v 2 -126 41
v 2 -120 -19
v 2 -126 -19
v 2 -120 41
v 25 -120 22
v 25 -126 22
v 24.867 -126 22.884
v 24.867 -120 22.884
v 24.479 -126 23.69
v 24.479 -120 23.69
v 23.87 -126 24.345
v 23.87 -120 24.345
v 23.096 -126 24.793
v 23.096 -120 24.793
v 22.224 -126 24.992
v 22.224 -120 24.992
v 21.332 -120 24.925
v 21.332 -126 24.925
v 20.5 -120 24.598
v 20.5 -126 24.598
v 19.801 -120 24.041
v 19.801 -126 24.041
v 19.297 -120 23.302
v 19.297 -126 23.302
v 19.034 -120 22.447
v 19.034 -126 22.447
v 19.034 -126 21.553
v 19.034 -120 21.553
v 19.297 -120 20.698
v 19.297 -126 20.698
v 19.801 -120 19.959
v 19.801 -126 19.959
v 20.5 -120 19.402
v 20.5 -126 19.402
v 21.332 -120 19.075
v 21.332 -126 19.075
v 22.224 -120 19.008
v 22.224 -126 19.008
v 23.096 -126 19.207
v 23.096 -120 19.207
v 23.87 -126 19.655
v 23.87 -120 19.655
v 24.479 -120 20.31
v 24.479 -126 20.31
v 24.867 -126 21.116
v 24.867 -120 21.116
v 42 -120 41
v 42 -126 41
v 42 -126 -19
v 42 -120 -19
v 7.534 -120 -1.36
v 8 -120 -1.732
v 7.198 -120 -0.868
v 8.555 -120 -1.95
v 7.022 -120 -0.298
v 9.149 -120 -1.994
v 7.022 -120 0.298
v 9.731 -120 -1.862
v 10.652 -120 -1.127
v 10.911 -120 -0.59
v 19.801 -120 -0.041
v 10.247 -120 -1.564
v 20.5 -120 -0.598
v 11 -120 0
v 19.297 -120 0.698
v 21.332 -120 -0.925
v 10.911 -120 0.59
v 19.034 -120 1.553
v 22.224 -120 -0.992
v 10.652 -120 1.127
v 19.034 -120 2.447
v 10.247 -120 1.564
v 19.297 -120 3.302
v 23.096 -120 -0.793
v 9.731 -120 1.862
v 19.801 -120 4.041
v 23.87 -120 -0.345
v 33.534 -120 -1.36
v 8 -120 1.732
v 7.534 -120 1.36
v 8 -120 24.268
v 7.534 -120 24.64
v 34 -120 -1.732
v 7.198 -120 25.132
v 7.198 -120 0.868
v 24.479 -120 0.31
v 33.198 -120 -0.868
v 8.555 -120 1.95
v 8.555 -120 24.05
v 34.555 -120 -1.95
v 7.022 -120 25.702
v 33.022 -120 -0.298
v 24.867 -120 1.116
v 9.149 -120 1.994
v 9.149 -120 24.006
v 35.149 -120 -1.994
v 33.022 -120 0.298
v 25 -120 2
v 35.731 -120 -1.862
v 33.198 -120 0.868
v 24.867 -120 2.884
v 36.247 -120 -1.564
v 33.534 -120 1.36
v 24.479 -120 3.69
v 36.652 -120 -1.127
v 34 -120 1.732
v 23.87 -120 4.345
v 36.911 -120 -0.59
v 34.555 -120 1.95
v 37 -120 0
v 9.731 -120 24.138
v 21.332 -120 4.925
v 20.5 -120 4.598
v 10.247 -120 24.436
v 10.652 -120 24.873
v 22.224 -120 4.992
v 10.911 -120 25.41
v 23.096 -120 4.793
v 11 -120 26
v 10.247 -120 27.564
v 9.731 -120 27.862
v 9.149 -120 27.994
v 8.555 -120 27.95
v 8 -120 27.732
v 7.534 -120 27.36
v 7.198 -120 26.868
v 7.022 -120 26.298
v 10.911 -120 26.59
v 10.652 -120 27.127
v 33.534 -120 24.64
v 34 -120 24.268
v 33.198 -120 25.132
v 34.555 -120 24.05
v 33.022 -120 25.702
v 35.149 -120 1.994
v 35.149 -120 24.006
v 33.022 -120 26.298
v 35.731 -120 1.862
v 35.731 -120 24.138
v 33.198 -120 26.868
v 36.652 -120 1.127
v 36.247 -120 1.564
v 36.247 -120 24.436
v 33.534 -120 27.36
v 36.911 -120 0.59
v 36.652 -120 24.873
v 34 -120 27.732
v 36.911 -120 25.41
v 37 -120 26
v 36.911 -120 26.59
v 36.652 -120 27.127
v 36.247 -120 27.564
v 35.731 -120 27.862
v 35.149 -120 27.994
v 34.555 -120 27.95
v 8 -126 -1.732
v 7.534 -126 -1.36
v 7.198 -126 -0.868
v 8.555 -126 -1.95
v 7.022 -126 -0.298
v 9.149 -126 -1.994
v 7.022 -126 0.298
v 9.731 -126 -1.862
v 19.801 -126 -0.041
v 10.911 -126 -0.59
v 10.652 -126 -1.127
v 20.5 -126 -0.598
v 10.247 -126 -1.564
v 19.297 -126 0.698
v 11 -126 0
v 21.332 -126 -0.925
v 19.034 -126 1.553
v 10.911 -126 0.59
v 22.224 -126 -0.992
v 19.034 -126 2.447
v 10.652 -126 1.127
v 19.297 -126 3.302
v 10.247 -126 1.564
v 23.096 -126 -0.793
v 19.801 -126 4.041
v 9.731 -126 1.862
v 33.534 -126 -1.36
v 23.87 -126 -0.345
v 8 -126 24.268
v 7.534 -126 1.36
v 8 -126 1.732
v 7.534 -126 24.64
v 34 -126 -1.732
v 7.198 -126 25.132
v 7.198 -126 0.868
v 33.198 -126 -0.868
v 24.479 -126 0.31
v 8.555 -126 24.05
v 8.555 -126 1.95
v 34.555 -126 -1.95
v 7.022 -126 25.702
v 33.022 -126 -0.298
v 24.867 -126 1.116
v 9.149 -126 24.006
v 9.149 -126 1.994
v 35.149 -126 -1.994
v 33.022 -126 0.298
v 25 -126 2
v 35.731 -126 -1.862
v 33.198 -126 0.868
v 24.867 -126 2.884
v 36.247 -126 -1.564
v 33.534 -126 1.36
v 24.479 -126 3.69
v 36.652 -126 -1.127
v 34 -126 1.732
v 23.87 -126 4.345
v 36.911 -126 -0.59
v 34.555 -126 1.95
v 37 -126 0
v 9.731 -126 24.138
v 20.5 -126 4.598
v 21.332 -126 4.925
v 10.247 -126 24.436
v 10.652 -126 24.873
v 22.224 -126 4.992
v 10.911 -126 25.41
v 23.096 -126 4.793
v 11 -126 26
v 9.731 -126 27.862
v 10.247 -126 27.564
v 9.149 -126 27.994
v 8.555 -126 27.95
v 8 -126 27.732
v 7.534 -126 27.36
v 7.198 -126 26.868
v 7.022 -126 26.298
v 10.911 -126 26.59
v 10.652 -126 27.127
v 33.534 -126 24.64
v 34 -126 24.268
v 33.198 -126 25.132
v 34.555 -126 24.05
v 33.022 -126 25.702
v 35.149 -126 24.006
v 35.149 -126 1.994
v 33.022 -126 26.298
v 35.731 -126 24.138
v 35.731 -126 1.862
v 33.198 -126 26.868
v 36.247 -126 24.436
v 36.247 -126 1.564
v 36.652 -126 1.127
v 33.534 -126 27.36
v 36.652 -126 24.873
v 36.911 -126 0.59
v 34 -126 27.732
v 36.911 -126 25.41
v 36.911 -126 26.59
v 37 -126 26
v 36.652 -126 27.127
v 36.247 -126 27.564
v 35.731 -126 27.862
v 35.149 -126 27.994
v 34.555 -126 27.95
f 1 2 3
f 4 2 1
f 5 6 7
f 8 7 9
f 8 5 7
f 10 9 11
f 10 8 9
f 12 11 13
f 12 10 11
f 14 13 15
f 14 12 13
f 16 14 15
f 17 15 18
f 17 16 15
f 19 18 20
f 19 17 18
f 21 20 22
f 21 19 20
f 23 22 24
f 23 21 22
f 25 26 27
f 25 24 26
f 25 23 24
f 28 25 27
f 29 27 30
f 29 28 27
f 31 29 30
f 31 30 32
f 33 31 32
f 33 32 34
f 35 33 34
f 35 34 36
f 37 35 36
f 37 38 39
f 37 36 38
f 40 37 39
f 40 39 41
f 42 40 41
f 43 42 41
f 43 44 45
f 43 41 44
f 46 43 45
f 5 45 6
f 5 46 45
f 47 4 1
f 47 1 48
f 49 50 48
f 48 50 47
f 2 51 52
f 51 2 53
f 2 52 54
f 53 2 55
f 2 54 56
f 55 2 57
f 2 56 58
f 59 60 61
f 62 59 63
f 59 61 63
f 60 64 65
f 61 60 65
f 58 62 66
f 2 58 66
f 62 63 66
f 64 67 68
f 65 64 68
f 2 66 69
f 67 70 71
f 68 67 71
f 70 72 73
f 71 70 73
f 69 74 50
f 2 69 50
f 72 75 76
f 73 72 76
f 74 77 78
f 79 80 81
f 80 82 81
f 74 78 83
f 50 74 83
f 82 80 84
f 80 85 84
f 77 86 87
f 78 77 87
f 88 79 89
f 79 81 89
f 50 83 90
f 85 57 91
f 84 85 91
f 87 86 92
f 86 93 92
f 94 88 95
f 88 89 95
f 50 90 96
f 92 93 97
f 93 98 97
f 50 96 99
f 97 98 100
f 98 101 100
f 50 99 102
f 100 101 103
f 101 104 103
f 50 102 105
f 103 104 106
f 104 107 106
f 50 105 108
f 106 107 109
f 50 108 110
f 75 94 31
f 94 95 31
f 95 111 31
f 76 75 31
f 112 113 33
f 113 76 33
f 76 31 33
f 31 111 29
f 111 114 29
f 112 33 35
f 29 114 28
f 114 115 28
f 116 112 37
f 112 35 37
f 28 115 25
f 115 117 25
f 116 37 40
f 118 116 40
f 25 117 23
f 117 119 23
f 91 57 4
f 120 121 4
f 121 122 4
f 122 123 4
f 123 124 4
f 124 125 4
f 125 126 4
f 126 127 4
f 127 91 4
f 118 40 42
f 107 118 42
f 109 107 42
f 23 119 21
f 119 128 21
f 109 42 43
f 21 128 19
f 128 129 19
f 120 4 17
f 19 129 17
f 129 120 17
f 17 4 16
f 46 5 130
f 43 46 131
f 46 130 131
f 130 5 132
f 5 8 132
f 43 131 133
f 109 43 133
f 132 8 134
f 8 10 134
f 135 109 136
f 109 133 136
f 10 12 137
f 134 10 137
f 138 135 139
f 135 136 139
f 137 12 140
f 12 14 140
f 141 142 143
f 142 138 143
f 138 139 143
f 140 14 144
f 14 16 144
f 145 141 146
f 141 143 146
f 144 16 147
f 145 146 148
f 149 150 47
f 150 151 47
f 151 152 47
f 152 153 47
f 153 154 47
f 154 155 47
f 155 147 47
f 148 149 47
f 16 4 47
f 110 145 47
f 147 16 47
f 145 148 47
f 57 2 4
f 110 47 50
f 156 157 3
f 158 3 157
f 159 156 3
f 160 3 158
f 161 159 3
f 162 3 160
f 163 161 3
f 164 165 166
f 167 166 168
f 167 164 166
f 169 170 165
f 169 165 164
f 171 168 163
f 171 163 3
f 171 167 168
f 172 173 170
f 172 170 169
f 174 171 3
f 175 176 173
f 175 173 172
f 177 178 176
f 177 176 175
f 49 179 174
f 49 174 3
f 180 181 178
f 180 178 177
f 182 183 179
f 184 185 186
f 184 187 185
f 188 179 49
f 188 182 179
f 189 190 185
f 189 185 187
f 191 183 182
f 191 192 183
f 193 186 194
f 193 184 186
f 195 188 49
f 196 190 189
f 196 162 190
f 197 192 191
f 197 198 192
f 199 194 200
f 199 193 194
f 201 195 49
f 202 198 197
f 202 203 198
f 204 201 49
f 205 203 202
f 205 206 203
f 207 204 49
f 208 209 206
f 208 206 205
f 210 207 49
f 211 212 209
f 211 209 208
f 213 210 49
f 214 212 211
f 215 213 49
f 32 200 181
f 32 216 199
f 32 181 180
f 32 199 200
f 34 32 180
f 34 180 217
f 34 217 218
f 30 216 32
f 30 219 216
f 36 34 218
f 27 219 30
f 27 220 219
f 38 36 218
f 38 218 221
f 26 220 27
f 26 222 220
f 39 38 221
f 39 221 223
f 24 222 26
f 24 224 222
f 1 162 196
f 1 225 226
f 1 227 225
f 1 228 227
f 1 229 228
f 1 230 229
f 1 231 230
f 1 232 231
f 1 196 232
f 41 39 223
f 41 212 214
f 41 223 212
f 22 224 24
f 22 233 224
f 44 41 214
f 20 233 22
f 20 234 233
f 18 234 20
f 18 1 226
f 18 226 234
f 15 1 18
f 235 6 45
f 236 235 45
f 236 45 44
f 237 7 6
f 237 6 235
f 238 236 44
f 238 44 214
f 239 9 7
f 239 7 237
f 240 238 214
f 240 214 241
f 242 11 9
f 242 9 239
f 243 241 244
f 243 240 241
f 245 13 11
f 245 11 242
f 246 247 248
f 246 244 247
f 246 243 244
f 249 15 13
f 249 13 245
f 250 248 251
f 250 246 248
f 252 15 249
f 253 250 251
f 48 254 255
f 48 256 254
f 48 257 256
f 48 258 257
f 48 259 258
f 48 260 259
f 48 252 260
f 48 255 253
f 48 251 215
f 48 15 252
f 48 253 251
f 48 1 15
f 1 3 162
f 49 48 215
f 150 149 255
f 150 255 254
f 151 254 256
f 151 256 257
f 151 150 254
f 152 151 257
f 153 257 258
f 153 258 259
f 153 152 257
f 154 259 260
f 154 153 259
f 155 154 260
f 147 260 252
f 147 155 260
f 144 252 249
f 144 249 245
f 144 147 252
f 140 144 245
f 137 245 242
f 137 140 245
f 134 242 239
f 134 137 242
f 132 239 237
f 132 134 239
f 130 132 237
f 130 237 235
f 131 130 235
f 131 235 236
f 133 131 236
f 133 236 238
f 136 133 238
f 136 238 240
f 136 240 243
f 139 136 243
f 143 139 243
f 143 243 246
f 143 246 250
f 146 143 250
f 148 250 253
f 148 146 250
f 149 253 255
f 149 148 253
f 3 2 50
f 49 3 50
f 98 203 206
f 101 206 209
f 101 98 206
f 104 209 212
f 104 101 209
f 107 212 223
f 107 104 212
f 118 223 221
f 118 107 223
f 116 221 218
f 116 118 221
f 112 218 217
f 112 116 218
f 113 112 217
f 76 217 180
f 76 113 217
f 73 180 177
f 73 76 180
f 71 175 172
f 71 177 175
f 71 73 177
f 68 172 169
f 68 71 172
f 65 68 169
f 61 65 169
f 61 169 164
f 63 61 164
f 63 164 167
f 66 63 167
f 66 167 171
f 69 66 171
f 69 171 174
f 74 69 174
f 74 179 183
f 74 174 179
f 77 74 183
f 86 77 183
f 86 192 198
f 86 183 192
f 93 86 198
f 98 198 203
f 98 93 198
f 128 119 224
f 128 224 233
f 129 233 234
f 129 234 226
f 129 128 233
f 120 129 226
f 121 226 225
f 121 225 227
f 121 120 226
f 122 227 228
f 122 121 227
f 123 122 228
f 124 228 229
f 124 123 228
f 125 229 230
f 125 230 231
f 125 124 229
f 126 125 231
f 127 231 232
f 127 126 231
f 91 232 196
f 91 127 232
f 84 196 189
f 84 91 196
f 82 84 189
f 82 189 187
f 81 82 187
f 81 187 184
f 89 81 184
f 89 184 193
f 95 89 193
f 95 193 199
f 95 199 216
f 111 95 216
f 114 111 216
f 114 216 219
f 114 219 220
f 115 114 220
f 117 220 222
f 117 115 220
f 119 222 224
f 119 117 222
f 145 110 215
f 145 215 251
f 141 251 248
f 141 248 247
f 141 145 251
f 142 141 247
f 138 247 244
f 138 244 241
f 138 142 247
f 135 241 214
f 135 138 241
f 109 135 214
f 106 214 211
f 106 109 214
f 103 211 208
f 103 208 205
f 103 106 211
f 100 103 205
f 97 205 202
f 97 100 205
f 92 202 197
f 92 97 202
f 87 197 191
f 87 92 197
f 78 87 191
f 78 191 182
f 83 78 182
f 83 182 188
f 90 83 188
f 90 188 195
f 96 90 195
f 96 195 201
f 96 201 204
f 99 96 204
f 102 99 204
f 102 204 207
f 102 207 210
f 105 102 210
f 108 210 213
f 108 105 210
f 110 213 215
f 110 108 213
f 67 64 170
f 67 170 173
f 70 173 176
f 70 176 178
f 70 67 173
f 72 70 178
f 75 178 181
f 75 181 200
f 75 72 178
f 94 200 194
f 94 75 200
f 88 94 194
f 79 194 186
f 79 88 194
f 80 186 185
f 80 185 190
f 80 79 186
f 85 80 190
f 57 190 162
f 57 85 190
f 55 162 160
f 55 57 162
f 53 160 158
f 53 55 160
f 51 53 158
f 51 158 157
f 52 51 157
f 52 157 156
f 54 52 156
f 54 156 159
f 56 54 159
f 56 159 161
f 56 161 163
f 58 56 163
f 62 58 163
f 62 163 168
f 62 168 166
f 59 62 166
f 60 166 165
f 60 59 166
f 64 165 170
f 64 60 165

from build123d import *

# Parameters (mm, degrees)
CYLINDER006_R          = 3
CYLINDER006_DEPTH      = 10
CYLINDER006_ROLL_ANGLE = 90
ARRAY006_Z_COUNT       = 2
ARRAY006_Z_PITCH       = 20
CYLINDER005_R          = 2
CYLINDER005_DEPTH      = 6
CYLINDER005_ROLL_ANGLE = 90
ARRAY005_X_COUNT       = 2
ARRAY005_X_PITCH       = 26
ARRAY005_Z_COUNT       = 2
ARRAY005_Z_PITCH       = 26
BOX013_W               = 40
BOX013_H               = 60
BOX013_DEPTH           = 6
BOX013_ROLL_ANGLE      = 90


with BuildPart() as array006:
    # Cylinder006 → Cylinder006 (new body)
    with BuildSketch(Plane.XY):
        Circle(CYLINDER006_R)
    extrude(amount=CYLINDER006_DEPTH)


with BuildPart() as array006_1:
    # Cylinder006 roll: moved
    add(array006.part.rotate(Axis((0, 0, 0), (1, 0, 0)), CYLINDER006_ROLL_ANGLE))


with BuildPart() as array006_2:
    # Cylinder006 placement: moved
    add(array006_1.part.moved(Location((20, 0, 21))))

    # Array006 Z: Array006 ×2


with BuildPart() as array006_3:
    add(array006_2.part)
    with Locations(*[(0, 0, i * ARRAY006_Z_PITCH) for i in range(1, ARRAY006_Z_COUNT)]):
        add(array006_2.part)


with BuildPart() as array005:
    # Cylinder005 → Cylinder005 (new body)
    with BuildSketch(Plane.XY):
        Circle(CYLINDER005_R)
    extrude(amount=CYLINDER005_DEPTH)


with BuildPart() as array005_1:
    # Cylinder005 roll: moved
    add(array005.part.rotate(Axis((0, 0, 0), (1, 0, 0)), CYLINDER005_ROLL_ANGLE))


with BuildPart() as array005_2:
    # Cylinder005 placement: moved
    add(array005_1.part.moved(Location((7, 0, 19))))

    # Array005 X: Array005 ×2


with BuildPart() as array005_3:
    add(array005_2.part)
    with Locations(*[(i * ARRAY005_X_PITCH, 0, 0) for i in range(1, ARRAY005_X_COUNT)]):
        add(array005_2.part)

    # Array005 Z: Array005 ×2


with BuildPart() as array005_4:
    add(array005_3.part)
    with Locations(*[(0, 0, i * ARRAY005_Z_PITCH) for i in range(1, ARRAY005_Z_COUNT)]):
        add(array005_3.part)


with BuildPart() as soporte_pieza_brazo_con_guia_lineal:
    # Box013 → Box013 (new body)
    with BuildSketch(Plane.XY):
        with Locations((20, 30)):
            Rectangle(BOX013_W, BOX013_H)
    extrude(amount=BOX013_DEPTH)


with BuildPart() as soporte_pieza_brazo_con_guia_lineal_1:
    # Box013 roll: moved
    add(soporte_pieza_brazo_con_guia_lineal.part.rotate(Axis((0, 0, 0), (1, 0, 0)), BOX013_ROLL_ANGLE))


with BuildPart() as soporte_pieza_brazo_con_guia_lineal_2:
    # Box013 placement: moved
    add(soporte_pieza_brazo_con_guia_lineal_1.part)

    # Cut006: cut Array005
    add(array005_4.part, mode=Mode.SUBTRACT)

    # Cut007: cut Array006
    add(array006_3.part, mode=Mode.SUBTRACT)


with BuildPart() as soporte_pieza_brazo_con_guia_lineal_3:
    # Cut007 placement: moved
    add(soporte_pieza_brazo_con_guia_lineal_2.part.moved(Location((2, -120, -19))))


solid = soporte_pieza_brazo_con_guia_lineal_3.part
